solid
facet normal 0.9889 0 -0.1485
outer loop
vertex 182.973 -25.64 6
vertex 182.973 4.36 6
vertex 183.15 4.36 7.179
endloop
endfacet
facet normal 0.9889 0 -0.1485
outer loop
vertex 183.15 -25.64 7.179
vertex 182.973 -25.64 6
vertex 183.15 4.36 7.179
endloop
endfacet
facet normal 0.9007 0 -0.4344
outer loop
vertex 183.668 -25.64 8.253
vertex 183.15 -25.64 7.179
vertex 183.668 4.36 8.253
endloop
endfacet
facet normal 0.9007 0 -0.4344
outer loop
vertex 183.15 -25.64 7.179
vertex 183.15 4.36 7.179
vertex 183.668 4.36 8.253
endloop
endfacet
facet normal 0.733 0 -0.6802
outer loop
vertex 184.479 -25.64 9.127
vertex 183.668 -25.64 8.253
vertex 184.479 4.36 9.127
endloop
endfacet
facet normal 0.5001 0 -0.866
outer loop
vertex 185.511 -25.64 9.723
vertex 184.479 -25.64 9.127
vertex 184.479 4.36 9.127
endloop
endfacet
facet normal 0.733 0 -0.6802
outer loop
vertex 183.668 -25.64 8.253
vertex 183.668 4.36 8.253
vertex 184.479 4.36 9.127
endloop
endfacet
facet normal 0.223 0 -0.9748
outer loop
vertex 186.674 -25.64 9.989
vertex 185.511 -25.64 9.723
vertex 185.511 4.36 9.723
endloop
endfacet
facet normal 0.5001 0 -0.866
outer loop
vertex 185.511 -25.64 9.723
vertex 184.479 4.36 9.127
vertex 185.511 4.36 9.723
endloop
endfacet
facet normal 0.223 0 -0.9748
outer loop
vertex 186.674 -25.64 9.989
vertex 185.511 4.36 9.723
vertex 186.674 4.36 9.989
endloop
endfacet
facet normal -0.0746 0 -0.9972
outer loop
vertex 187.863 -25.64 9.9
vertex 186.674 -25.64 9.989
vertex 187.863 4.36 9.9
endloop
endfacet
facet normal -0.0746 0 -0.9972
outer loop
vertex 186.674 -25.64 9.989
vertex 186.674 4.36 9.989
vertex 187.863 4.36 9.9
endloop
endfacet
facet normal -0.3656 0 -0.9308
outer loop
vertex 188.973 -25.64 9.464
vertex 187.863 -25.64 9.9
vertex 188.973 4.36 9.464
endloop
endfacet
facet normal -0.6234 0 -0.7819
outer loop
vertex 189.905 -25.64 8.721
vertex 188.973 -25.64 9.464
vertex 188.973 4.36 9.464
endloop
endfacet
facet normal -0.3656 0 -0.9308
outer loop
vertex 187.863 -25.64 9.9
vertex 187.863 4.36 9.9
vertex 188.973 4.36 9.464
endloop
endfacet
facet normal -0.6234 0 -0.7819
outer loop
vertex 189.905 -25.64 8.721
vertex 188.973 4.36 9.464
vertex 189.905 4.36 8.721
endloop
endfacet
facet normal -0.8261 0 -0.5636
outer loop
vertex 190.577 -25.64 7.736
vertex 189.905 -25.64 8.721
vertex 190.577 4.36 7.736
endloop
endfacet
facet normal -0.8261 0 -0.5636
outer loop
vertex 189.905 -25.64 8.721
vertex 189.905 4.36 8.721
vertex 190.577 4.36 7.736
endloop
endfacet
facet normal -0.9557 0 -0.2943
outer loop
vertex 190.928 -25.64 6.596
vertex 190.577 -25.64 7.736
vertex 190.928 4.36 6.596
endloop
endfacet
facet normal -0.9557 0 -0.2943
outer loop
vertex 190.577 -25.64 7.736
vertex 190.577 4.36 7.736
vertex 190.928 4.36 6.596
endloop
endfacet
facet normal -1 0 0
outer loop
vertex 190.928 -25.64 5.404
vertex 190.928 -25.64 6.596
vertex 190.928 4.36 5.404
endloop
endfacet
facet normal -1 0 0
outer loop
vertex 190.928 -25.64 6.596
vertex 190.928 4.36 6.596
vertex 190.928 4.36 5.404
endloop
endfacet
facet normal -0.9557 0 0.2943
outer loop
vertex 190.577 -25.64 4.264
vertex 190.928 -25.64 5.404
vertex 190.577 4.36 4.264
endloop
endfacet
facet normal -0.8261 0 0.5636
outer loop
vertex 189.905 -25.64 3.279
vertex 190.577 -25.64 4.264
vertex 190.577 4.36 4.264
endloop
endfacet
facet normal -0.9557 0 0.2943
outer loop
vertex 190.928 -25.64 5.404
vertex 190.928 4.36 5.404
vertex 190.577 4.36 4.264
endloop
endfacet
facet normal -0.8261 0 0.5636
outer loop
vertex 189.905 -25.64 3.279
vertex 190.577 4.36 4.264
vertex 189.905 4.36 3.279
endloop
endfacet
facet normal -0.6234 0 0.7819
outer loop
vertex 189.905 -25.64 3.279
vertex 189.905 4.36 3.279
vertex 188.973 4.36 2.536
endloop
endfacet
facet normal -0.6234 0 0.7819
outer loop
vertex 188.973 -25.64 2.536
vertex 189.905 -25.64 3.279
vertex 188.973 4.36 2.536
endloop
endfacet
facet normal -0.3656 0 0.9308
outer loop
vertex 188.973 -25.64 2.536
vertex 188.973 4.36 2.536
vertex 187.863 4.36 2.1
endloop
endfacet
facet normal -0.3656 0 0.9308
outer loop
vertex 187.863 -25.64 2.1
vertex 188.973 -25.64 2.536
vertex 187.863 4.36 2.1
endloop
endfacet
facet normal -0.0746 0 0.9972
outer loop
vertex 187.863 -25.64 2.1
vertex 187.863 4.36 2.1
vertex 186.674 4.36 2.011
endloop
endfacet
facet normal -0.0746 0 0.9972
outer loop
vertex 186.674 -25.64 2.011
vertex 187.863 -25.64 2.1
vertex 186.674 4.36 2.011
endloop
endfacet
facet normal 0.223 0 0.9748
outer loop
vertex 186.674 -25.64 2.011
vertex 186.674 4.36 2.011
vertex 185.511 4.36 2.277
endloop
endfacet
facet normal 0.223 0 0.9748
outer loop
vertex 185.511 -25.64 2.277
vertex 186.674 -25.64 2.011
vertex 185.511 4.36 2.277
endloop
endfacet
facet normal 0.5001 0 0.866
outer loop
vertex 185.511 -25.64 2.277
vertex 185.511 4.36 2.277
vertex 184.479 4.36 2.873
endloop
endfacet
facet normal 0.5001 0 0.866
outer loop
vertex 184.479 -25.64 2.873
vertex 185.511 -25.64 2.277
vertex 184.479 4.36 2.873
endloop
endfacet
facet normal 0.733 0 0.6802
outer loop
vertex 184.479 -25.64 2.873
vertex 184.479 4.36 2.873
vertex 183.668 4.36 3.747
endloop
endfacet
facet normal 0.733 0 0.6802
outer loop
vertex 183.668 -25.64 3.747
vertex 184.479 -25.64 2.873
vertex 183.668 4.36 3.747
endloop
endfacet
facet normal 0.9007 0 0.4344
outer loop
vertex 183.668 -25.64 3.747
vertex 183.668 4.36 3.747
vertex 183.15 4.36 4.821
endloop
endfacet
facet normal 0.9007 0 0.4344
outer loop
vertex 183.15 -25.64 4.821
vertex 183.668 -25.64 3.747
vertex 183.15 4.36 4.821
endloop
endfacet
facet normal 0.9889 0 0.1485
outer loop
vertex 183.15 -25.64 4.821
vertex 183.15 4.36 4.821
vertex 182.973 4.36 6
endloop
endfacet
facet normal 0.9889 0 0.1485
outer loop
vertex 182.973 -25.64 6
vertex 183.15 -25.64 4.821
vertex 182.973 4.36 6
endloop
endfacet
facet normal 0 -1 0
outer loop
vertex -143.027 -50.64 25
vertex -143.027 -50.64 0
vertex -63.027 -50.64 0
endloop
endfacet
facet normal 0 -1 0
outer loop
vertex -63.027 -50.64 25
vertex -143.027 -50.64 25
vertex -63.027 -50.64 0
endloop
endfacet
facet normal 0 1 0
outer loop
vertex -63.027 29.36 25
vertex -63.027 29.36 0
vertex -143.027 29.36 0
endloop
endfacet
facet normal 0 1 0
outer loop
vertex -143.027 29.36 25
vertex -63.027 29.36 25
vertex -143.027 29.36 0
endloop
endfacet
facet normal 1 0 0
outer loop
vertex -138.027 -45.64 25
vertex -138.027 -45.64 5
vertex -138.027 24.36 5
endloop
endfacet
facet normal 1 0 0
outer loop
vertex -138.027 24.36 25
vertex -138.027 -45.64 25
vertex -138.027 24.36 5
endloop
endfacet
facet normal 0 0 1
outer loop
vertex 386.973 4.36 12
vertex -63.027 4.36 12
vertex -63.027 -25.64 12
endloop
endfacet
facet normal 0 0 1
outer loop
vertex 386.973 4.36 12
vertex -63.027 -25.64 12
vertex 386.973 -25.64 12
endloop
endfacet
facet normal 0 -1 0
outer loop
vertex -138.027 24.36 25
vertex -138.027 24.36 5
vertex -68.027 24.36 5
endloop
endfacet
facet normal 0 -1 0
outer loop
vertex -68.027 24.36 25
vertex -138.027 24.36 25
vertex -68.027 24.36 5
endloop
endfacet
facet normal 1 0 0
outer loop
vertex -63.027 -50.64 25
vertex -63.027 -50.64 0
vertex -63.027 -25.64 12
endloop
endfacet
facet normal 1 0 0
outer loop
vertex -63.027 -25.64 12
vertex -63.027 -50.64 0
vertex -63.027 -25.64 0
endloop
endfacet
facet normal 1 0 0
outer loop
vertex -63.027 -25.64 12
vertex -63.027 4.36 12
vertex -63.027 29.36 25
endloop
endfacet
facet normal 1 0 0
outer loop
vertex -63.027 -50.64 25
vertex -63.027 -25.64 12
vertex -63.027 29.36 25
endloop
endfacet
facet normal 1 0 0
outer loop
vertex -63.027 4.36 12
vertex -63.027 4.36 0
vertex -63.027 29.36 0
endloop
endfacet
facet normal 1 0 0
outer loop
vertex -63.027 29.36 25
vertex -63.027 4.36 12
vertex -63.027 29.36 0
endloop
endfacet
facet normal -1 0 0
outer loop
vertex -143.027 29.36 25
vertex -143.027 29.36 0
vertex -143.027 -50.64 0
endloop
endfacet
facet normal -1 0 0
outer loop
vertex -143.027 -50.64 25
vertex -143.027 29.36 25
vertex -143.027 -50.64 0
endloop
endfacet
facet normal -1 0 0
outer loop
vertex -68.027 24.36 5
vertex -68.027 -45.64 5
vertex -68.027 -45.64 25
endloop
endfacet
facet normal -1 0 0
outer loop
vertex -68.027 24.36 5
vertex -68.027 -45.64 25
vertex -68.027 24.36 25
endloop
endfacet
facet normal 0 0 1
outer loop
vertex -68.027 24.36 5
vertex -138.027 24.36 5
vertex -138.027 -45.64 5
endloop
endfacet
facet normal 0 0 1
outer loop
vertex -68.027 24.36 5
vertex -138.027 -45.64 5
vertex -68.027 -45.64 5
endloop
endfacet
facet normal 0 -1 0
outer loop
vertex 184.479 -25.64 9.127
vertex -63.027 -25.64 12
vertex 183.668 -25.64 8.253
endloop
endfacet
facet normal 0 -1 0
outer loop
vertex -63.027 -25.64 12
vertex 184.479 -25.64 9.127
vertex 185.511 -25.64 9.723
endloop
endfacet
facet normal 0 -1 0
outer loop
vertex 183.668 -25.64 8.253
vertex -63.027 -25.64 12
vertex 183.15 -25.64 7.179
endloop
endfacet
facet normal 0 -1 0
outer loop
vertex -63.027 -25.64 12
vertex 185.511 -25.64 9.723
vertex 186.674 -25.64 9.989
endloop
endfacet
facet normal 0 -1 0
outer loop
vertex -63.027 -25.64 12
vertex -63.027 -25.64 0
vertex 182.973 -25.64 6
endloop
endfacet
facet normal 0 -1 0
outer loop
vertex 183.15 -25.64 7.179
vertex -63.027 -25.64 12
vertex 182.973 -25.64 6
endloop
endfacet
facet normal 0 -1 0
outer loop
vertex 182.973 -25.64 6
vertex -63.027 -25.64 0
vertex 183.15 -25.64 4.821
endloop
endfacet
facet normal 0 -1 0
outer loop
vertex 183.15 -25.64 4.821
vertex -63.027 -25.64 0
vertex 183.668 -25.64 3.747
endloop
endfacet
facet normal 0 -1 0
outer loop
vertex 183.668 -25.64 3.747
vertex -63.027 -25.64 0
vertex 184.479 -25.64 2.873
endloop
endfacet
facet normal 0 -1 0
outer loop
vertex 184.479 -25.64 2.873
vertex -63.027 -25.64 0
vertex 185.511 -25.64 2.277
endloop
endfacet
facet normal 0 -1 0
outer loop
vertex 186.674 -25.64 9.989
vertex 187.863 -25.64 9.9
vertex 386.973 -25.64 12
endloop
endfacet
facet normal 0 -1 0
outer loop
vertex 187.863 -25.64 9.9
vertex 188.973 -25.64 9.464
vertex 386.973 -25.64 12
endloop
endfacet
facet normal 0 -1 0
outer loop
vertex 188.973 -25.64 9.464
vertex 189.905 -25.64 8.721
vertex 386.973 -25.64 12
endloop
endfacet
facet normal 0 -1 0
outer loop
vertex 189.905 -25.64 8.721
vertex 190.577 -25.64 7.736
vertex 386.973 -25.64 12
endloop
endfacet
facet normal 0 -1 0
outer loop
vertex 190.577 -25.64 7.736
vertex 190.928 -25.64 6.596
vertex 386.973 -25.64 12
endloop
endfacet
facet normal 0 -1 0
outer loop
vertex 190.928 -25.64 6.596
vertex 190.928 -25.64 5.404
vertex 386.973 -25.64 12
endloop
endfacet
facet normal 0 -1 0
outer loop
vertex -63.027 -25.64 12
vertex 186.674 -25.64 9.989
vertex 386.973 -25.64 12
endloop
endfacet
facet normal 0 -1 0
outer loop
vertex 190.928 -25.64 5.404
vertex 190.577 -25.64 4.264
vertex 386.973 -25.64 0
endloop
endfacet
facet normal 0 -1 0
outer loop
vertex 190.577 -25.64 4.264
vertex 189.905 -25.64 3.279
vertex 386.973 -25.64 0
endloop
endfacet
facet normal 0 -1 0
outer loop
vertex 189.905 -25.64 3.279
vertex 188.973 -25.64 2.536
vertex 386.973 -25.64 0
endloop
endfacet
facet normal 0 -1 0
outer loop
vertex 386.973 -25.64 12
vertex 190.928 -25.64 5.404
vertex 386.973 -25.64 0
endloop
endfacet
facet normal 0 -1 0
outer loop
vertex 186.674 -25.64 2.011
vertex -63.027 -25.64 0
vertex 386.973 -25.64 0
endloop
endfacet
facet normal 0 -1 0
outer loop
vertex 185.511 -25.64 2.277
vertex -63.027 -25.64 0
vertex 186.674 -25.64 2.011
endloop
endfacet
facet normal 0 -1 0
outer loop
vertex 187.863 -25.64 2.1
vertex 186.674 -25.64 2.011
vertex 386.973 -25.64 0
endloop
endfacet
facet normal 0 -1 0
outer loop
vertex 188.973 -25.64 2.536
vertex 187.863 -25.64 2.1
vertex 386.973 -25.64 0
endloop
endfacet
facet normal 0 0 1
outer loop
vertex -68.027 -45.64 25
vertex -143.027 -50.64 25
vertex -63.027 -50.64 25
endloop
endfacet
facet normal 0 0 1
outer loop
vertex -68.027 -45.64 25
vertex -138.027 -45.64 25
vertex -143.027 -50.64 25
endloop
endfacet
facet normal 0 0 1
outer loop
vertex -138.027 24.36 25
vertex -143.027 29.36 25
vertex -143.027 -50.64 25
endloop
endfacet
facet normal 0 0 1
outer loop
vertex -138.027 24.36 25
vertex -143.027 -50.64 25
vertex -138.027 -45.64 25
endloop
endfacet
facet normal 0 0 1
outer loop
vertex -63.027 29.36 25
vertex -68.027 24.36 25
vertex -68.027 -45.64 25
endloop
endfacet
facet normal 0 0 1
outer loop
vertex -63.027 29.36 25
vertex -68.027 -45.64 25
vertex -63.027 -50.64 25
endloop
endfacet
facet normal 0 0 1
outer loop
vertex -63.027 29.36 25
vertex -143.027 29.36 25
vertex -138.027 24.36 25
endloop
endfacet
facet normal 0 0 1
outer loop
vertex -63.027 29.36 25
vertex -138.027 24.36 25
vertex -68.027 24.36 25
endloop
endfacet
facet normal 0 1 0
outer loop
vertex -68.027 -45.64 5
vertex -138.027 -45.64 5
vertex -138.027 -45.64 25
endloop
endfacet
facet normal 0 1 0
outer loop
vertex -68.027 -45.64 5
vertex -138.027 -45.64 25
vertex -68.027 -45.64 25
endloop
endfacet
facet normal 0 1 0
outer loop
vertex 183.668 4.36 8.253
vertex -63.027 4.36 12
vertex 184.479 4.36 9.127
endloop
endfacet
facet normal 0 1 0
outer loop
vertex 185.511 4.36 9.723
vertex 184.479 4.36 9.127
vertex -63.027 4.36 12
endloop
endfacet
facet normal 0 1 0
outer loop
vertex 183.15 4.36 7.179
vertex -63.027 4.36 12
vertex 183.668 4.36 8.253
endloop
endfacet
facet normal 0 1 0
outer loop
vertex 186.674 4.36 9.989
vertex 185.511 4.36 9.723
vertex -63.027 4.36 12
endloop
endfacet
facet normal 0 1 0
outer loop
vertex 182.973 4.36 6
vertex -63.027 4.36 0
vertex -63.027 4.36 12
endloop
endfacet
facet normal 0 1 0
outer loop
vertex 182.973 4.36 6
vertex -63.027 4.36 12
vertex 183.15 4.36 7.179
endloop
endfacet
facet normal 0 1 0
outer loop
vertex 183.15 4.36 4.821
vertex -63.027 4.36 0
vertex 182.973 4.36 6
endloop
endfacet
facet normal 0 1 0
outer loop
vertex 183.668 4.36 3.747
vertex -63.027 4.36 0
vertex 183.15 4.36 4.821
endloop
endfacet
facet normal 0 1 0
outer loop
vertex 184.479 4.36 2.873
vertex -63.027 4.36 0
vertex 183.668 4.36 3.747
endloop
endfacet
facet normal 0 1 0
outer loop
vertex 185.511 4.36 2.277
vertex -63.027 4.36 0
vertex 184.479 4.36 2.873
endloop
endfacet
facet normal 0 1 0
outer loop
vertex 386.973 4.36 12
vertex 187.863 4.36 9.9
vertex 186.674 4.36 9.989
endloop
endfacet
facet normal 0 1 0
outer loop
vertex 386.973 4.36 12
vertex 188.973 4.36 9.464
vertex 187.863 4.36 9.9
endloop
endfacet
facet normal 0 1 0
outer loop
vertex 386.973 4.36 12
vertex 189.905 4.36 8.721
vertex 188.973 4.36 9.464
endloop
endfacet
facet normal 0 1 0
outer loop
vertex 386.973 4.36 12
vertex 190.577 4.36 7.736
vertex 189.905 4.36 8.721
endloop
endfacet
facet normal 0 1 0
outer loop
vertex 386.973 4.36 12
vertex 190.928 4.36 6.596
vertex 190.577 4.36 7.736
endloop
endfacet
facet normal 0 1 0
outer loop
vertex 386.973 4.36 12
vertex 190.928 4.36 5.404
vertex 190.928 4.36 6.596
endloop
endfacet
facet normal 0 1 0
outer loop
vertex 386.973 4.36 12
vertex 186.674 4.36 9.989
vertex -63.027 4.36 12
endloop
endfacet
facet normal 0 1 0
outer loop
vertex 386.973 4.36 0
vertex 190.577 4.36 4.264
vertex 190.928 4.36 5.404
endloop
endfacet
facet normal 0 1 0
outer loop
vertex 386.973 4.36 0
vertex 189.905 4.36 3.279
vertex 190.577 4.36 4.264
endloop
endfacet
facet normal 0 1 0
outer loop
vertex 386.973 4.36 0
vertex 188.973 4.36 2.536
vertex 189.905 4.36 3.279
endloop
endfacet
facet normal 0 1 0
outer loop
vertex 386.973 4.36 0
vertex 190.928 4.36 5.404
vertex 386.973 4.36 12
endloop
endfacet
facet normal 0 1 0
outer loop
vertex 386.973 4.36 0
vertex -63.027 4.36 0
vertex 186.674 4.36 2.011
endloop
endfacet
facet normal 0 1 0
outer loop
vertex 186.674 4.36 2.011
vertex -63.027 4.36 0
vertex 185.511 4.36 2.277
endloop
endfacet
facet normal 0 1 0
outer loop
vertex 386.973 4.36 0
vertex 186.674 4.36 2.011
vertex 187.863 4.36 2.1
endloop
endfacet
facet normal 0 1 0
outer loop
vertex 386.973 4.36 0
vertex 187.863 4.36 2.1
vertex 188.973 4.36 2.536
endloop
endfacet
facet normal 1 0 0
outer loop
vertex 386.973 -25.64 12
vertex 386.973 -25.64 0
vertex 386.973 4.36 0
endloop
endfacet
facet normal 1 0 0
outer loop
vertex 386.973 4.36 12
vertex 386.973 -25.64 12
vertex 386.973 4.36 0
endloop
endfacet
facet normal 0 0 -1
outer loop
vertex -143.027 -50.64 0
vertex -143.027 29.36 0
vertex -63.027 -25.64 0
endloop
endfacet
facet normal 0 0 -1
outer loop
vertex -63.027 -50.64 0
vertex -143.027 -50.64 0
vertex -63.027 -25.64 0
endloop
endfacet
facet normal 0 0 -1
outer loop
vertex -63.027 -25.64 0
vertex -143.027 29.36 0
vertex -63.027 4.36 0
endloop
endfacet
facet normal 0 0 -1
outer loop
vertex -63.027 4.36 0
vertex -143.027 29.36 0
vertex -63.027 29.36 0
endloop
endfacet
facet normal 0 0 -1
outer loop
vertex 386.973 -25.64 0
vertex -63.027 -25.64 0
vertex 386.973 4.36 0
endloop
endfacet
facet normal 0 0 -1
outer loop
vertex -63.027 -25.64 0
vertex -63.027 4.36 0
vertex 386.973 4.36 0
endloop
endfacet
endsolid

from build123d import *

# Parameters (mm, degrees)
F0_W     = 450
F0_H     = 30
F1_DEPTH = 12
F0_W_2   = 70
F0_H_2   = 70
F2_DEPTH = 25
F3_DEPTH = 5
F5_D     = 8


with BuildPart() as f1:
    # F0 (on Top) → F1 (new body)
    with BuildSketch(Plane.XY):
        with Locations((161.972634, -10.640169)):
            Rectangle(F0_W, F0_H)
    extrude(amount=F1_DEPTH)

    # F0 (on Top) → F2 (join)
    with BuildSketch(Plane.XY):
        Polygon((-63.027366, 29.359831), (-143.027366, 29.359831), (-143.027366, -50.640169), (-63.027366, -50.640169), (-63.027366, -25.640169), (-63.027366, 4.359831), align=None)
        with Locations((-103.027366, -10.640169)):
            Rectangle(F0_W_2, F0_H_2, mode=Mode.SUBTRACT)
    extrude(amount=F2_DEPTH)

    # F0 (on Top) → F3 (join)
    with BuildSketch(Plane.XY):
        with Locations((-103.027366, -10.640169)):
            Rectangle(F0_W_2, F0_H_2)
    extrude(amount=F3_DEPTH)

    # F5 (through all)
    with Locations(Plane.XZ.offset(25.640169)):
        with Locations((186.972634, 6)):
            Hole(F5_D / 2)


solid = f1.part
